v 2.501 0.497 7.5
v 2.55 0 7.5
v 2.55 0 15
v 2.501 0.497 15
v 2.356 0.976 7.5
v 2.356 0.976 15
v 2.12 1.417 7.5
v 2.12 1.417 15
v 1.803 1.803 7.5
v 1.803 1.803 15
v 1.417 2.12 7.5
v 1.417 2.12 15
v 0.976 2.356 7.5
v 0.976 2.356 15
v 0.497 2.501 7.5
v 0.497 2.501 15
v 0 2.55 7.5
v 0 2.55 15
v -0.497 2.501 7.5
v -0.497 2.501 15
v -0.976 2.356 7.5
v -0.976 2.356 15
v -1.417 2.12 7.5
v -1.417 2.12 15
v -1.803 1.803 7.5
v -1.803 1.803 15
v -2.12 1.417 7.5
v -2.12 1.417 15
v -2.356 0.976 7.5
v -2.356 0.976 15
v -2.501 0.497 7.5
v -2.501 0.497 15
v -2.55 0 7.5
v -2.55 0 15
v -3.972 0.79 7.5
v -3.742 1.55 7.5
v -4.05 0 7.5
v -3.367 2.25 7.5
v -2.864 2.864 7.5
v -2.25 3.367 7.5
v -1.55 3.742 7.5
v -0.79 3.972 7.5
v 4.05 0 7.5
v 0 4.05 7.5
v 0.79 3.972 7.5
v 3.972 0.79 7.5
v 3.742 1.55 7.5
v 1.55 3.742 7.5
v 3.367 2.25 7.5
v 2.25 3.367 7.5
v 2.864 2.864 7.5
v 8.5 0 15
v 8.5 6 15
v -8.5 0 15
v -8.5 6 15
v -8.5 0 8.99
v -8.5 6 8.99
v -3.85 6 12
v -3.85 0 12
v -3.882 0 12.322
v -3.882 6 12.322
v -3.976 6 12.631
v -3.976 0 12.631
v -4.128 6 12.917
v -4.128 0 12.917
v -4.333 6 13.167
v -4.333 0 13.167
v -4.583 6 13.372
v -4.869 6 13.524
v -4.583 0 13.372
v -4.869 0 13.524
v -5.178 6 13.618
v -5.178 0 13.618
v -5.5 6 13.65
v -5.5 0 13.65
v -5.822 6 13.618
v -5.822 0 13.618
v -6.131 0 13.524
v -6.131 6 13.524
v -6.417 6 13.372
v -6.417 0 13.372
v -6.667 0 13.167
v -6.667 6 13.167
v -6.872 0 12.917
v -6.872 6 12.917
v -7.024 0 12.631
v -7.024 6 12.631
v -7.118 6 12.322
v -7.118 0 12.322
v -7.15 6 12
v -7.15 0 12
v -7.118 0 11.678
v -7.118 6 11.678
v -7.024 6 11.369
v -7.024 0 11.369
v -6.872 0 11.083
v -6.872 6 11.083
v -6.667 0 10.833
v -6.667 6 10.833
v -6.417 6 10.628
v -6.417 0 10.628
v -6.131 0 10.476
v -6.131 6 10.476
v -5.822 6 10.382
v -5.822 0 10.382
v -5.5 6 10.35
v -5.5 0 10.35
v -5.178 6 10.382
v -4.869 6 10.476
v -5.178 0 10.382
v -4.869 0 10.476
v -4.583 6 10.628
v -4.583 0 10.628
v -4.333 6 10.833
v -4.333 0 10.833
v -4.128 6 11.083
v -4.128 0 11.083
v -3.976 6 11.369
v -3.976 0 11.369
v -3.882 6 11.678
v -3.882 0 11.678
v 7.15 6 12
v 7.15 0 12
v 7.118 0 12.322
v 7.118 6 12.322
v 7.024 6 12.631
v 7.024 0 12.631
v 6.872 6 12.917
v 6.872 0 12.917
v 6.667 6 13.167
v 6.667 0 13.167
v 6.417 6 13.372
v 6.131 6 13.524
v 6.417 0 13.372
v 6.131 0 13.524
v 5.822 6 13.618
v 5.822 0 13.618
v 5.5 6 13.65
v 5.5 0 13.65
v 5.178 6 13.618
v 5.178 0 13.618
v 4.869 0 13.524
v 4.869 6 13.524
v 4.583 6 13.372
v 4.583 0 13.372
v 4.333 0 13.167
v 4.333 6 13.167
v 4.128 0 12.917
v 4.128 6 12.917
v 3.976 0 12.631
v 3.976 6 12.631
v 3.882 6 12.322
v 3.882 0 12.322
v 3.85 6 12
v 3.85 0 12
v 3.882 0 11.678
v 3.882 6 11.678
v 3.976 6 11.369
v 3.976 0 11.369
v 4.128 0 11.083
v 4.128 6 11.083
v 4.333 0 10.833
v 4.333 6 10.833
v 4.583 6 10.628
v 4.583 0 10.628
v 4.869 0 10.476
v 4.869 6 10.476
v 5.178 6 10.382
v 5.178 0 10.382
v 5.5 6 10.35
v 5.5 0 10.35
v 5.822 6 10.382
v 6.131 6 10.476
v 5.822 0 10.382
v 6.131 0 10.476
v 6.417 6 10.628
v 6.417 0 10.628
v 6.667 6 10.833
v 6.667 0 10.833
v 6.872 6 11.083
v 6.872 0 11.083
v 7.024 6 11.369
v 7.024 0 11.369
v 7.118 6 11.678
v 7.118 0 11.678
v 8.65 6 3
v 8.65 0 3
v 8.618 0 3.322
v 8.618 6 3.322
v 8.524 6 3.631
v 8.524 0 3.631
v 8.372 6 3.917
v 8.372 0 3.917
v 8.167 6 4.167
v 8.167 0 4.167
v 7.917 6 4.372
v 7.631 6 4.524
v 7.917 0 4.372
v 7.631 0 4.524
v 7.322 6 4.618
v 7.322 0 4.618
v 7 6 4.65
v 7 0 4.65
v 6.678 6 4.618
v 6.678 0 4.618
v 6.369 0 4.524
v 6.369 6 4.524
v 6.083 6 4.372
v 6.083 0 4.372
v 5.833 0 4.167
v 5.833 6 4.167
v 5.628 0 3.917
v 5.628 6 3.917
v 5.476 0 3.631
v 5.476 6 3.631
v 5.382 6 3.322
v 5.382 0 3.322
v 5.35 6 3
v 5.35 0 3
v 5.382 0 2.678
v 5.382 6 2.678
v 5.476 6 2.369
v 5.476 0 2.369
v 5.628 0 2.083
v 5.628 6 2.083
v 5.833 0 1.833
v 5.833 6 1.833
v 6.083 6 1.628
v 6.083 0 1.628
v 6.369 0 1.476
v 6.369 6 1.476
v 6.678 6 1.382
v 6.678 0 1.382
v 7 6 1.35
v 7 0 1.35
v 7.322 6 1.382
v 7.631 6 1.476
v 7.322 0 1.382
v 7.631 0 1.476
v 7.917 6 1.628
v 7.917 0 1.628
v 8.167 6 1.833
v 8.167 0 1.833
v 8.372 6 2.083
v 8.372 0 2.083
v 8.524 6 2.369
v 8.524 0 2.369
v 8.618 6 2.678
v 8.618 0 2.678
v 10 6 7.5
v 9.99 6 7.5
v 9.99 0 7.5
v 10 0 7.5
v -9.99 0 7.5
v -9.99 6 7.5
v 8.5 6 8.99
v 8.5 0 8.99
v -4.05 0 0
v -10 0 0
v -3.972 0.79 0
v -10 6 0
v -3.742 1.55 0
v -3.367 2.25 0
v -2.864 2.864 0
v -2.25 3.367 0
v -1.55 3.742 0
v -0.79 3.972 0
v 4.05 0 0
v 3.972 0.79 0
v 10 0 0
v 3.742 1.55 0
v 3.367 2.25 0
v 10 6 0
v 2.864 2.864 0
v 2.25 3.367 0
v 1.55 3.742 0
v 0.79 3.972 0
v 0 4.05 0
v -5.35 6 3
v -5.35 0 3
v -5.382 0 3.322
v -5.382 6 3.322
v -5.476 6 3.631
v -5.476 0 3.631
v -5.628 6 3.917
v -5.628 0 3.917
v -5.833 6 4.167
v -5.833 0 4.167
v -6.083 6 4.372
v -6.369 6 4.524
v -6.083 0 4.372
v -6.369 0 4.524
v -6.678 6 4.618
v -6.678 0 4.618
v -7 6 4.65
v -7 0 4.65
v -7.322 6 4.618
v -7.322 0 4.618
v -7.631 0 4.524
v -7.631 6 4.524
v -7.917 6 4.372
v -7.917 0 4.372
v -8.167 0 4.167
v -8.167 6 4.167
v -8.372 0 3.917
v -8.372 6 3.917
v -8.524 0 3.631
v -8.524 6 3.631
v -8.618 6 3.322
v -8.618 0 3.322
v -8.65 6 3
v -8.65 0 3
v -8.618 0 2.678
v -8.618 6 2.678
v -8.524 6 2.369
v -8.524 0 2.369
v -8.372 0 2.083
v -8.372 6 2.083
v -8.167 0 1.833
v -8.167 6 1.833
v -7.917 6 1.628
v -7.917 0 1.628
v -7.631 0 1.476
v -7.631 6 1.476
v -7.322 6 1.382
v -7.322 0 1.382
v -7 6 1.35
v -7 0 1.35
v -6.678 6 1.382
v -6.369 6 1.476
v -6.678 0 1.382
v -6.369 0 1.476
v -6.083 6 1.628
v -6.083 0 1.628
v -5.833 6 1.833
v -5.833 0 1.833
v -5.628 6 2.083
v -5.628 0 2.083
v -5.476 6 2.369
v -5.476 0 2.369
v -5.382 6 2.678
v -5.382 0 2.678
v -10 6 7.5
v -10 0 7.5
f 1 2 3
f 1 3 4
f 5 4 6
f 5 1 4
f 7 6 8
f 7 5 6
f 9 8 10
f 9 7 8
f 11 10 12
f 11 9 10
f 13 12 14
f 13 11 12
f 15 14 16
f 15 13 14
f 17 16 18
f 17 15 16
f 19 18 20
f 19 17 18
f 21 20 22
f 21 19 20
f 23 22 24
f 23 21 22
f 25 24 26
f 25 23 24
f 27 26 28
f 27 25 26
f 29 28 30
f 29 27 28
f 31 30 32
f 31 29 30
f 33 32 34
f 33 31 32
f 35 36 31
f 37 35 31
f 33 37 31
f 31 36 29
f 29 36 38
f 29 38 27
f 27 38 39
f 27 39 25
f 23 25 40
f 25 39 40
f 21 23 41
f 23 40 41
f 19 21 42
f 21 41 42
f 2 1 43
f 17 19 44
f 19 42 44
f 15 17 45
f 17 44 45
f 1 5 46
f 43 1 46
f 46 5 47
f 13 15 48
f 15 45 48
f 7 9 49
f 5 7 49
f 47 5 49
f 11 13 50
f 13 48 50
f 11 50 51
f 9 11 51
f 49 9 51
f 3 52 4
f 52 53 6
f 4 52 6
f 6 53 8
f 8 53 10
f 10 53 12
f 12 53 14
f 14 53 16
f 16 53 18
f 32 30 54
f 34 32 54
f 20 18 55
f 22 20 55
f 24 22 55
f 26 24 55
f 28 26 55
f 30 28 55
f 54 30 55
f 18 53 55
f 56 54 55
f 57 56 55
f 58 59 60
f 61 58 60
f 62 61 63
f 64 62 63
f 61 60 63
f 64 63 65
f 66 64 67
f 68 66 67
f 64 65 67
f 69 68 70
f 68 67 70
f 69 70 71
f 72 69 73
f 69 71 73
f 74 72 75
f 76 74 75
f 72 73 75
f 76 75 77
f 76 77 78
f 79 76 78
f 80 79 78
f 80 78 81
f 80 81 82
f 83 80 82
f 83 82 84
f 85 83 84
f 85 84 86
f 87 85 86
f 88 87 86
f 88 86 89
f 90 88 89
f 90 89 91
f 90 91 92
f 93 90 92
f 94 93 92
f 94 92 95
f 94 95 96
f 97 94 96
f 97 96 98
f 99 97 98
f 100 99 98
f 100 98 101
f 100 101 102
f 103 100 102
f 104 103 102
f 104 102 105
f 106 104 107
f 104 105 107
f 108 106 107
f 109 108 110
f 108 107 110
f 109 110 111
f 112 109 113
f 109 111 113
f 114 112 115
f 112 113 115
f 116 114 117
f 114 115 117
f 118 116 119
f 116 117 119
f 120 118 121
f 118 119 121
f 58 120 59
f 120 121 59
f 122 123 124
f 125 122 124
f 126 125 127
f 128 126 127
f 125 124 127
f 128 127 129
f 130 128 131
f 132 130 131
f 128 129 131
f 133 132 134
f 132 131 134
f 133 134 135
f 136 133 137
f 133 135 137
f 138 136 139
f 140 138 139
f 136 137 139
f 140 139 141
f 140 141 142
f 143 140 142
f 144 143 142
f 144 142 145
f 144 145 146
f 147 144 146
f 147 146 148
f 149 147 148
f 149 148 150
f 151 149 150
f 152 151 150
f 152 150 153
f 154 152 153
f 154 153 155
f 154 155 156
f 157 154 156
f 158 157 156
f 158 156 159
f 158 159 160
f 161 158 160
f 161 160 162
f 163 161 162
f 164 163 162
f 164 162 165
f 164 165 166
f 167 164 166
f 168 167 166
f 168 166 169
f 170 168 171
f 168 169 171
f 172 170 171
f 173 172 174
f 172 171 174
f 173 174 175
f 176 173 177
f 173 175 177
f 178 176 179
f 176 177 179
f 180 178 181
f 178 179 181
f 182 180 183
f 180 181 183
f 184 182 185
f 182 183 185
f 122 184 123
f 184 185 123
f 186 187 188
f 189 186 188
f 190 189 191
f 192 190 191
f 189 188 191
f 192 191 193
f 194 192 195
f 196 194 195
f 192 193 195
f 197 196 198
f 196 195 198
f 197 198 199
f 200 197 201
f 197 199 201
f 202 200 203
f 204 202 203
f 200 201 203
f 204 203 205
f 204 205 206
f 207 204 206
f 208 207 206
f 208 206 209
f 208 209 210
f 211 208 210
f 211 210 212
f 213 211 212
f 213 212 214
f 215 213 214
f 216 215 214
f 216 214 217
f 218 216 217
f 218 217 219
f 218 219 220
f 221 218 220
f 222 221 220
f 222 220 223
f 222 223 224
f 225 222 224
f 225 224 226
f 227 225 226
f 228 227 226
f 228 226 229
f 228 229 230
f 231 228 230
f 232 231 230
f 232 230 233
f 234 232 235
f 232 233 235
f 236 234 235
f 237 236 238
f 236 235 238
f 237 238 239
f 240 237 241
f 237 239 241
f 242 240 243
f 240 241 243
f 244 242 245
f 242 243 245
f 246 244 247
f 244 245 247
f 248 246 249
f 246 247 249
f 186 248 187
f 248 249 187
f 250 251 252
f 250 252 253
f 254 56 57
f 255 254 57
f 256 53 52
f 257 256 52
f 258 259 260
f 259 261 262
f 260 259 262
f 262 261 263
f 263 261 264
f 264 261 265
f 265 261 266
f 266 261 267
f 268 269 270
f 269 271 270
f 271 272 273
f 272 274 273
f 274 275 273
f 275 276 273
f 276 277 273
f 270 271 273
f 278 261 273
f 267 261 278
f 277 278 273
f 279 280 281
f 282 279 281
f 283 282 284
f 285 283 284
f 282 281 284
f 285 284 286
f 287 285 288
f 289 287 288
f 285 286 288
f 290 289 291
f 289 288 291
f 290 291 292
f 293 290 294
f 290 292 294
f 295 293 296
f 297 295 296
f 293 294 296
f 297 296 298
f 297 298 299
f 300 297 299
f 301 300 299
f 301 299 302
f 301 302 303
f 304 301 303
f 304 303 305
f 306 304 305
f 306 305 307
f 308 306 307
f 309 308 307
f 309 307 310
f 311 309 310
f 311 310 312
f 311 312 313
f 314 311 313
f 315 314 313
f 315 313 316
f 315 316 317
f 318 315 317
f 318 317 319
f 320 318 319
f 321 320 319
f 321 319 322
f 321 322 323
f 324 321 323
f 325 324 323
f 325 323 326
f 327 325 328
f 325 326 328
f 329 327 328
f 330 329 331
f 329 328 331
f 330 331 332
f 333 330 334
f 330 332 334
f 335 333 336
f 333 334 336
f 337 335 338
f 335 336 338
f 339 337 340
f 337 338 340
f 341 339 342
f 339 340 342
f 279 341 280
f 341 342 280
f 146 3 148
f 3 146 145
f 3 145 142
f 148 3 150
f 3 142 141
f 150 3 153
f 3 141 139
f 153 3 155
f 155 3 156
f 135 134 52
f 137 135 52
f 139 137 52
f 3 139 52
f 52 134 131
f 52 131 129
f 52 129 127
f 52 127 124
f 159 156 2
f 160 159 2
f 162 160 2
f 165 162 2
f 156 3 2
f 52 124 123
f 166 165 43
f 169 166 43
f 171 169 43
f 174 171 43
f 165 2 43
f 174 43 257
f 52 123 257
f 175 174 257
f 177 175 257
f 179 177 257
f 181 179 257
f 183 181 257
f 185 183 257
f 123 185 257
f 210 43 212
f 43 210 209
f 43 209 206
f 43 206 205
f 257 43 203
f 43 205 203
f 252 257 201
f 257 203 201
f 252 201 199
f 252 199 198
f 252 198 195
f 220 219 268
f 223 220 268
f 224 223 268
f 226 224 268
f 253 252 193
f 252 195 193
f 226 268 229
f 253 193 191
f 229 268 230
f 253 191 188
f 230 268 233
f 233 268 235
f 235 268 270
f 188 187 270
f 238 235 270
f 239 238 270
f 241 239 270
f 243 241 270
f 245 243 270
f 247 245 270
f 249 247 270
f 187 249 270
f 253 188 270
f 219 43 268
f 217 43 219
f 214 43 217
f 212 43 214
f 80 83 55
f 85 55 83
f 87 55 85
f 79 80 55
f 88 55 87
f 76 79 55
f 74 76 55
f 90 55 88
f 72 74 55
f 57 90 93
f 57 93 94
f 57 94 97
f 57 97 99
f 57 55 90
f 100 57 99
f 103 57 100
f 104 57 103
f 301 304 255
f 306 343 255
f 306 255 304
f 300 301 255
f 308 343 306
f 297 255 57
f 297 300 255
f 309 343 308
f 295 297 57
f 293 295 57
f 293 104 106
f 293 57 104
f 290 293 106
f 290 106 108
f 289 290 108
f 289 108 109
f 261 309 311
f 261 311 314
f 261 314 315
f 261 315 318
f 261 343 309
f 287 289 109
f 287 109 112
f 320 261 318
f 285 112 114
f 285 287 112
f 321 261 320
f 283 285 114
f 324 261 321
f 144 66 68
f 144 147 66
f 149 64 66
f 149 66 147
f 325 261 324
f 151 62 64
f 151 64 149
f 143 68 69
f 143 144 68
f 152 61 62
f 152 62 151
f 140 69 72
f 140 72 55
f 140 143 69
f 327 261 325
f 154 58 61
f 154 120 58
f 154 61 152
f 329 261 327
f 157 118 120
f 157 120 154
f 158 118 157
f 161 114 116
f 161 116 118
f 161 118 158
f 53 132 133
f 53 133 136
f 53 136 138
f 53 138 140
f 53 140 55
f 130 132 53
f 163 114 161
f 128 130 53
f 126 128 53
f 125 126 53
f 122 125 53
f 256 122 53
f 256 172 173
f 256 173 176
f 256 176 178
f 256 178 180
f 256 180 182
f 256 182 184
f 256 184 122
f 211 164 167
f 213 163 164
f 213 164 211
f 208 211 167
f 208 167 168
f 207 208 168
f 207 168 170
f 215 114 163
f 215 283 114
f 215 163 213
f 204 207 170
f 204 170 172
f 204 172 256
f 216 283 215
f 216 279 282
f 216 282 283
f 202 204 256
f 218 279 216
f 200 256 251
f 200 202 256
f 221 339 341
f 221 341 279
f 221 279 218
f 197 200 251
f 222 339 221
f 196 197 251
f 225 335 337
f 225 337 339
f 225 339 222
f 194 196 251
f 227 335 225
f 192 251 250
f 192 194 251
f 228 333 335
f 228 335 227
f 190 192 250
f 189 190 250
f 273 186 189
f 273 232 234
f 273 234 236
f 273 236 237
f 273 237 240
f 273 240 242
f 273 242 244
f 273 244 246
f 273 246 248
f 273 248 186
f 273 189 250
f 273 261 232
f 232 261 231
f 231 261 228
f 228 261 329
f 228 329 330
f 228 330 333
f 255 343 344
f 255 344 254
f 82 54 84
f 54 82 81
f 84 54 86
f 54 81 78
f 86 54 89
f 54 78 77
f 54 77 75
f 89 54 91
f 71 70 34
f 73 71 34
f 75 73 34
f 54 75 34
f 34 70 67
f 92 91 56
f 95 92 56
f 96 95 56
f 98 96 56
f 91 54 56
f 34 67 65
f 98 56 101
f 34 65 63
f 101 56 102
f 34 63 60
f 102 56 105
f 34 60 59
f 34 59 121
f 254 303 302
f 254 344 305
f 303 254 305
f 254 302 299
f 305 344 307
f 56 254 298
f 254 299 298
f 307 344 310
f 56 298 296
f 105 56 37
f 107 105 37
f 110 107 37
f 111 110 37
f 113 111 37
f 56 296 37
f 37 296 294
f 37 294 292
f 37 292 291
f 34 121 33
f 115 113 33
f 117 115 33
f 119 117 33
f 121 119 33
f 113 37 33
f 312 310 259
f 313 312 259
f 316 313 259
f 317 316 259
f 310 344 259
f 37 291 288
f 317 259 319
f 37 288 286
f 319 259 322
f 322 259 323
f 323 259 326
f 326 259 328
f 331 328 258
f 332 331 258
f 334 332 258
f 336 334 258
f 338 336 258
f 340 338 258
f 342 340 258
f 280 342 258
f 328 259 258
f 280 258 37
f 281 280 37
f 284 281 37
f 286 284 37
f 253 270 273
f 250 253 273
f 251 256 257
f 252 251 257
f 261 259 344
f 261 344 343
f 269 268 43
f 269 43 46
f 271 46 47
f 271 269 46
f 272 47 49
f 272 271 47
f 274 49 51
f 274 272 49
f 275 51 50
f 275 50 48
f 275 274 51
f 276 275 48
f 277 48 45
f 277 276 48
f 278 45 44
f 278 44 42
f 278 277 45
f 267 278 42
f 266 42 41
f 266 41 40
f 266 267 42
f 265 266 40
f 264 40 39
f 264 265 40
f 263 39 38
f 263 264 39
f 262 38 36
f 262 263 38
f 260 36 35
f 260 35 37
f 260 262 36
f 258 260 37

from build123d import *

# Parameters (mm, degrees)
PAD_DEPTH       = 15
SKETCH003_W     = 20
SKETCH003_H     = 6
PAD001_DEPTH    = 7.5
SKETCH001_R     = 1.65
POCKET_DEPTH    = 6.001
SKETCH002_R     = 4.05
POCKET001_DEPTH = 7.5
CHAMFER_SIZE    = 1.49


with BuildPart() as part:
    # Sketch → Pad (new body)
    with BuildSketch(Plane.XY):
        with BuildLine():
            ThreePointArc((2.55, 0), (0, 2.55), (-2.55, 0))
            Line((-2.55, 0), (-8.5, 0))
            Line((-8.5, 0), (-8.5, 6))
            Line((-8.5, 6), (8.5, 6))
            Line((8.5, 6), (8.5, 0))
            Line((2.55, 0), (8.5, 0))
        make_face()
    extrude(amount=PAD_DEPTH)

    # Sketch003 → Pad001 (join)
    with BuildSketch(Plane.XY):
        with Locations((0, 3)):
            Rectangle(SKETCH003_W, SKETCH003_H)
    extrude(amount=PAD001_DEPTH)

    # Sketch001 → Pocket (cut, through all)
    with BuildSketch(Plane.XZ):
        with Locations((-7, 3)):
            Circle(SKETCH001_R)
        with Locations((-5.5, 12)):
            Circle(SKETCH001_R)
        with Locations((5.5, 12)):
            Circle(SKETCH001_R)
        with Locations((7, 3)):
            Circle(SKETCH001_R)
    extrude(amount=-POCKET_DEPTH, mode=Mode.SUBTRACT)

    # Sketch002 → Pocket001 (cut)
    with BuildSketch(Plane.XY):
        Circle(SKETCH002_R)
    extrude(amount=POCKET001_DEPTH, mode=Mode.SUBTRACT)

    # Chamfer
    chamfer_edges = [part.edges().sort_by_distance(p)[0] for p in [
        (8.5, 3, 7.5),
        (-8.5, 3, 7.5),
    ]]
    chamfer(chamfer_edges, length=CHAMFER_SIZE)


solid = part.part
